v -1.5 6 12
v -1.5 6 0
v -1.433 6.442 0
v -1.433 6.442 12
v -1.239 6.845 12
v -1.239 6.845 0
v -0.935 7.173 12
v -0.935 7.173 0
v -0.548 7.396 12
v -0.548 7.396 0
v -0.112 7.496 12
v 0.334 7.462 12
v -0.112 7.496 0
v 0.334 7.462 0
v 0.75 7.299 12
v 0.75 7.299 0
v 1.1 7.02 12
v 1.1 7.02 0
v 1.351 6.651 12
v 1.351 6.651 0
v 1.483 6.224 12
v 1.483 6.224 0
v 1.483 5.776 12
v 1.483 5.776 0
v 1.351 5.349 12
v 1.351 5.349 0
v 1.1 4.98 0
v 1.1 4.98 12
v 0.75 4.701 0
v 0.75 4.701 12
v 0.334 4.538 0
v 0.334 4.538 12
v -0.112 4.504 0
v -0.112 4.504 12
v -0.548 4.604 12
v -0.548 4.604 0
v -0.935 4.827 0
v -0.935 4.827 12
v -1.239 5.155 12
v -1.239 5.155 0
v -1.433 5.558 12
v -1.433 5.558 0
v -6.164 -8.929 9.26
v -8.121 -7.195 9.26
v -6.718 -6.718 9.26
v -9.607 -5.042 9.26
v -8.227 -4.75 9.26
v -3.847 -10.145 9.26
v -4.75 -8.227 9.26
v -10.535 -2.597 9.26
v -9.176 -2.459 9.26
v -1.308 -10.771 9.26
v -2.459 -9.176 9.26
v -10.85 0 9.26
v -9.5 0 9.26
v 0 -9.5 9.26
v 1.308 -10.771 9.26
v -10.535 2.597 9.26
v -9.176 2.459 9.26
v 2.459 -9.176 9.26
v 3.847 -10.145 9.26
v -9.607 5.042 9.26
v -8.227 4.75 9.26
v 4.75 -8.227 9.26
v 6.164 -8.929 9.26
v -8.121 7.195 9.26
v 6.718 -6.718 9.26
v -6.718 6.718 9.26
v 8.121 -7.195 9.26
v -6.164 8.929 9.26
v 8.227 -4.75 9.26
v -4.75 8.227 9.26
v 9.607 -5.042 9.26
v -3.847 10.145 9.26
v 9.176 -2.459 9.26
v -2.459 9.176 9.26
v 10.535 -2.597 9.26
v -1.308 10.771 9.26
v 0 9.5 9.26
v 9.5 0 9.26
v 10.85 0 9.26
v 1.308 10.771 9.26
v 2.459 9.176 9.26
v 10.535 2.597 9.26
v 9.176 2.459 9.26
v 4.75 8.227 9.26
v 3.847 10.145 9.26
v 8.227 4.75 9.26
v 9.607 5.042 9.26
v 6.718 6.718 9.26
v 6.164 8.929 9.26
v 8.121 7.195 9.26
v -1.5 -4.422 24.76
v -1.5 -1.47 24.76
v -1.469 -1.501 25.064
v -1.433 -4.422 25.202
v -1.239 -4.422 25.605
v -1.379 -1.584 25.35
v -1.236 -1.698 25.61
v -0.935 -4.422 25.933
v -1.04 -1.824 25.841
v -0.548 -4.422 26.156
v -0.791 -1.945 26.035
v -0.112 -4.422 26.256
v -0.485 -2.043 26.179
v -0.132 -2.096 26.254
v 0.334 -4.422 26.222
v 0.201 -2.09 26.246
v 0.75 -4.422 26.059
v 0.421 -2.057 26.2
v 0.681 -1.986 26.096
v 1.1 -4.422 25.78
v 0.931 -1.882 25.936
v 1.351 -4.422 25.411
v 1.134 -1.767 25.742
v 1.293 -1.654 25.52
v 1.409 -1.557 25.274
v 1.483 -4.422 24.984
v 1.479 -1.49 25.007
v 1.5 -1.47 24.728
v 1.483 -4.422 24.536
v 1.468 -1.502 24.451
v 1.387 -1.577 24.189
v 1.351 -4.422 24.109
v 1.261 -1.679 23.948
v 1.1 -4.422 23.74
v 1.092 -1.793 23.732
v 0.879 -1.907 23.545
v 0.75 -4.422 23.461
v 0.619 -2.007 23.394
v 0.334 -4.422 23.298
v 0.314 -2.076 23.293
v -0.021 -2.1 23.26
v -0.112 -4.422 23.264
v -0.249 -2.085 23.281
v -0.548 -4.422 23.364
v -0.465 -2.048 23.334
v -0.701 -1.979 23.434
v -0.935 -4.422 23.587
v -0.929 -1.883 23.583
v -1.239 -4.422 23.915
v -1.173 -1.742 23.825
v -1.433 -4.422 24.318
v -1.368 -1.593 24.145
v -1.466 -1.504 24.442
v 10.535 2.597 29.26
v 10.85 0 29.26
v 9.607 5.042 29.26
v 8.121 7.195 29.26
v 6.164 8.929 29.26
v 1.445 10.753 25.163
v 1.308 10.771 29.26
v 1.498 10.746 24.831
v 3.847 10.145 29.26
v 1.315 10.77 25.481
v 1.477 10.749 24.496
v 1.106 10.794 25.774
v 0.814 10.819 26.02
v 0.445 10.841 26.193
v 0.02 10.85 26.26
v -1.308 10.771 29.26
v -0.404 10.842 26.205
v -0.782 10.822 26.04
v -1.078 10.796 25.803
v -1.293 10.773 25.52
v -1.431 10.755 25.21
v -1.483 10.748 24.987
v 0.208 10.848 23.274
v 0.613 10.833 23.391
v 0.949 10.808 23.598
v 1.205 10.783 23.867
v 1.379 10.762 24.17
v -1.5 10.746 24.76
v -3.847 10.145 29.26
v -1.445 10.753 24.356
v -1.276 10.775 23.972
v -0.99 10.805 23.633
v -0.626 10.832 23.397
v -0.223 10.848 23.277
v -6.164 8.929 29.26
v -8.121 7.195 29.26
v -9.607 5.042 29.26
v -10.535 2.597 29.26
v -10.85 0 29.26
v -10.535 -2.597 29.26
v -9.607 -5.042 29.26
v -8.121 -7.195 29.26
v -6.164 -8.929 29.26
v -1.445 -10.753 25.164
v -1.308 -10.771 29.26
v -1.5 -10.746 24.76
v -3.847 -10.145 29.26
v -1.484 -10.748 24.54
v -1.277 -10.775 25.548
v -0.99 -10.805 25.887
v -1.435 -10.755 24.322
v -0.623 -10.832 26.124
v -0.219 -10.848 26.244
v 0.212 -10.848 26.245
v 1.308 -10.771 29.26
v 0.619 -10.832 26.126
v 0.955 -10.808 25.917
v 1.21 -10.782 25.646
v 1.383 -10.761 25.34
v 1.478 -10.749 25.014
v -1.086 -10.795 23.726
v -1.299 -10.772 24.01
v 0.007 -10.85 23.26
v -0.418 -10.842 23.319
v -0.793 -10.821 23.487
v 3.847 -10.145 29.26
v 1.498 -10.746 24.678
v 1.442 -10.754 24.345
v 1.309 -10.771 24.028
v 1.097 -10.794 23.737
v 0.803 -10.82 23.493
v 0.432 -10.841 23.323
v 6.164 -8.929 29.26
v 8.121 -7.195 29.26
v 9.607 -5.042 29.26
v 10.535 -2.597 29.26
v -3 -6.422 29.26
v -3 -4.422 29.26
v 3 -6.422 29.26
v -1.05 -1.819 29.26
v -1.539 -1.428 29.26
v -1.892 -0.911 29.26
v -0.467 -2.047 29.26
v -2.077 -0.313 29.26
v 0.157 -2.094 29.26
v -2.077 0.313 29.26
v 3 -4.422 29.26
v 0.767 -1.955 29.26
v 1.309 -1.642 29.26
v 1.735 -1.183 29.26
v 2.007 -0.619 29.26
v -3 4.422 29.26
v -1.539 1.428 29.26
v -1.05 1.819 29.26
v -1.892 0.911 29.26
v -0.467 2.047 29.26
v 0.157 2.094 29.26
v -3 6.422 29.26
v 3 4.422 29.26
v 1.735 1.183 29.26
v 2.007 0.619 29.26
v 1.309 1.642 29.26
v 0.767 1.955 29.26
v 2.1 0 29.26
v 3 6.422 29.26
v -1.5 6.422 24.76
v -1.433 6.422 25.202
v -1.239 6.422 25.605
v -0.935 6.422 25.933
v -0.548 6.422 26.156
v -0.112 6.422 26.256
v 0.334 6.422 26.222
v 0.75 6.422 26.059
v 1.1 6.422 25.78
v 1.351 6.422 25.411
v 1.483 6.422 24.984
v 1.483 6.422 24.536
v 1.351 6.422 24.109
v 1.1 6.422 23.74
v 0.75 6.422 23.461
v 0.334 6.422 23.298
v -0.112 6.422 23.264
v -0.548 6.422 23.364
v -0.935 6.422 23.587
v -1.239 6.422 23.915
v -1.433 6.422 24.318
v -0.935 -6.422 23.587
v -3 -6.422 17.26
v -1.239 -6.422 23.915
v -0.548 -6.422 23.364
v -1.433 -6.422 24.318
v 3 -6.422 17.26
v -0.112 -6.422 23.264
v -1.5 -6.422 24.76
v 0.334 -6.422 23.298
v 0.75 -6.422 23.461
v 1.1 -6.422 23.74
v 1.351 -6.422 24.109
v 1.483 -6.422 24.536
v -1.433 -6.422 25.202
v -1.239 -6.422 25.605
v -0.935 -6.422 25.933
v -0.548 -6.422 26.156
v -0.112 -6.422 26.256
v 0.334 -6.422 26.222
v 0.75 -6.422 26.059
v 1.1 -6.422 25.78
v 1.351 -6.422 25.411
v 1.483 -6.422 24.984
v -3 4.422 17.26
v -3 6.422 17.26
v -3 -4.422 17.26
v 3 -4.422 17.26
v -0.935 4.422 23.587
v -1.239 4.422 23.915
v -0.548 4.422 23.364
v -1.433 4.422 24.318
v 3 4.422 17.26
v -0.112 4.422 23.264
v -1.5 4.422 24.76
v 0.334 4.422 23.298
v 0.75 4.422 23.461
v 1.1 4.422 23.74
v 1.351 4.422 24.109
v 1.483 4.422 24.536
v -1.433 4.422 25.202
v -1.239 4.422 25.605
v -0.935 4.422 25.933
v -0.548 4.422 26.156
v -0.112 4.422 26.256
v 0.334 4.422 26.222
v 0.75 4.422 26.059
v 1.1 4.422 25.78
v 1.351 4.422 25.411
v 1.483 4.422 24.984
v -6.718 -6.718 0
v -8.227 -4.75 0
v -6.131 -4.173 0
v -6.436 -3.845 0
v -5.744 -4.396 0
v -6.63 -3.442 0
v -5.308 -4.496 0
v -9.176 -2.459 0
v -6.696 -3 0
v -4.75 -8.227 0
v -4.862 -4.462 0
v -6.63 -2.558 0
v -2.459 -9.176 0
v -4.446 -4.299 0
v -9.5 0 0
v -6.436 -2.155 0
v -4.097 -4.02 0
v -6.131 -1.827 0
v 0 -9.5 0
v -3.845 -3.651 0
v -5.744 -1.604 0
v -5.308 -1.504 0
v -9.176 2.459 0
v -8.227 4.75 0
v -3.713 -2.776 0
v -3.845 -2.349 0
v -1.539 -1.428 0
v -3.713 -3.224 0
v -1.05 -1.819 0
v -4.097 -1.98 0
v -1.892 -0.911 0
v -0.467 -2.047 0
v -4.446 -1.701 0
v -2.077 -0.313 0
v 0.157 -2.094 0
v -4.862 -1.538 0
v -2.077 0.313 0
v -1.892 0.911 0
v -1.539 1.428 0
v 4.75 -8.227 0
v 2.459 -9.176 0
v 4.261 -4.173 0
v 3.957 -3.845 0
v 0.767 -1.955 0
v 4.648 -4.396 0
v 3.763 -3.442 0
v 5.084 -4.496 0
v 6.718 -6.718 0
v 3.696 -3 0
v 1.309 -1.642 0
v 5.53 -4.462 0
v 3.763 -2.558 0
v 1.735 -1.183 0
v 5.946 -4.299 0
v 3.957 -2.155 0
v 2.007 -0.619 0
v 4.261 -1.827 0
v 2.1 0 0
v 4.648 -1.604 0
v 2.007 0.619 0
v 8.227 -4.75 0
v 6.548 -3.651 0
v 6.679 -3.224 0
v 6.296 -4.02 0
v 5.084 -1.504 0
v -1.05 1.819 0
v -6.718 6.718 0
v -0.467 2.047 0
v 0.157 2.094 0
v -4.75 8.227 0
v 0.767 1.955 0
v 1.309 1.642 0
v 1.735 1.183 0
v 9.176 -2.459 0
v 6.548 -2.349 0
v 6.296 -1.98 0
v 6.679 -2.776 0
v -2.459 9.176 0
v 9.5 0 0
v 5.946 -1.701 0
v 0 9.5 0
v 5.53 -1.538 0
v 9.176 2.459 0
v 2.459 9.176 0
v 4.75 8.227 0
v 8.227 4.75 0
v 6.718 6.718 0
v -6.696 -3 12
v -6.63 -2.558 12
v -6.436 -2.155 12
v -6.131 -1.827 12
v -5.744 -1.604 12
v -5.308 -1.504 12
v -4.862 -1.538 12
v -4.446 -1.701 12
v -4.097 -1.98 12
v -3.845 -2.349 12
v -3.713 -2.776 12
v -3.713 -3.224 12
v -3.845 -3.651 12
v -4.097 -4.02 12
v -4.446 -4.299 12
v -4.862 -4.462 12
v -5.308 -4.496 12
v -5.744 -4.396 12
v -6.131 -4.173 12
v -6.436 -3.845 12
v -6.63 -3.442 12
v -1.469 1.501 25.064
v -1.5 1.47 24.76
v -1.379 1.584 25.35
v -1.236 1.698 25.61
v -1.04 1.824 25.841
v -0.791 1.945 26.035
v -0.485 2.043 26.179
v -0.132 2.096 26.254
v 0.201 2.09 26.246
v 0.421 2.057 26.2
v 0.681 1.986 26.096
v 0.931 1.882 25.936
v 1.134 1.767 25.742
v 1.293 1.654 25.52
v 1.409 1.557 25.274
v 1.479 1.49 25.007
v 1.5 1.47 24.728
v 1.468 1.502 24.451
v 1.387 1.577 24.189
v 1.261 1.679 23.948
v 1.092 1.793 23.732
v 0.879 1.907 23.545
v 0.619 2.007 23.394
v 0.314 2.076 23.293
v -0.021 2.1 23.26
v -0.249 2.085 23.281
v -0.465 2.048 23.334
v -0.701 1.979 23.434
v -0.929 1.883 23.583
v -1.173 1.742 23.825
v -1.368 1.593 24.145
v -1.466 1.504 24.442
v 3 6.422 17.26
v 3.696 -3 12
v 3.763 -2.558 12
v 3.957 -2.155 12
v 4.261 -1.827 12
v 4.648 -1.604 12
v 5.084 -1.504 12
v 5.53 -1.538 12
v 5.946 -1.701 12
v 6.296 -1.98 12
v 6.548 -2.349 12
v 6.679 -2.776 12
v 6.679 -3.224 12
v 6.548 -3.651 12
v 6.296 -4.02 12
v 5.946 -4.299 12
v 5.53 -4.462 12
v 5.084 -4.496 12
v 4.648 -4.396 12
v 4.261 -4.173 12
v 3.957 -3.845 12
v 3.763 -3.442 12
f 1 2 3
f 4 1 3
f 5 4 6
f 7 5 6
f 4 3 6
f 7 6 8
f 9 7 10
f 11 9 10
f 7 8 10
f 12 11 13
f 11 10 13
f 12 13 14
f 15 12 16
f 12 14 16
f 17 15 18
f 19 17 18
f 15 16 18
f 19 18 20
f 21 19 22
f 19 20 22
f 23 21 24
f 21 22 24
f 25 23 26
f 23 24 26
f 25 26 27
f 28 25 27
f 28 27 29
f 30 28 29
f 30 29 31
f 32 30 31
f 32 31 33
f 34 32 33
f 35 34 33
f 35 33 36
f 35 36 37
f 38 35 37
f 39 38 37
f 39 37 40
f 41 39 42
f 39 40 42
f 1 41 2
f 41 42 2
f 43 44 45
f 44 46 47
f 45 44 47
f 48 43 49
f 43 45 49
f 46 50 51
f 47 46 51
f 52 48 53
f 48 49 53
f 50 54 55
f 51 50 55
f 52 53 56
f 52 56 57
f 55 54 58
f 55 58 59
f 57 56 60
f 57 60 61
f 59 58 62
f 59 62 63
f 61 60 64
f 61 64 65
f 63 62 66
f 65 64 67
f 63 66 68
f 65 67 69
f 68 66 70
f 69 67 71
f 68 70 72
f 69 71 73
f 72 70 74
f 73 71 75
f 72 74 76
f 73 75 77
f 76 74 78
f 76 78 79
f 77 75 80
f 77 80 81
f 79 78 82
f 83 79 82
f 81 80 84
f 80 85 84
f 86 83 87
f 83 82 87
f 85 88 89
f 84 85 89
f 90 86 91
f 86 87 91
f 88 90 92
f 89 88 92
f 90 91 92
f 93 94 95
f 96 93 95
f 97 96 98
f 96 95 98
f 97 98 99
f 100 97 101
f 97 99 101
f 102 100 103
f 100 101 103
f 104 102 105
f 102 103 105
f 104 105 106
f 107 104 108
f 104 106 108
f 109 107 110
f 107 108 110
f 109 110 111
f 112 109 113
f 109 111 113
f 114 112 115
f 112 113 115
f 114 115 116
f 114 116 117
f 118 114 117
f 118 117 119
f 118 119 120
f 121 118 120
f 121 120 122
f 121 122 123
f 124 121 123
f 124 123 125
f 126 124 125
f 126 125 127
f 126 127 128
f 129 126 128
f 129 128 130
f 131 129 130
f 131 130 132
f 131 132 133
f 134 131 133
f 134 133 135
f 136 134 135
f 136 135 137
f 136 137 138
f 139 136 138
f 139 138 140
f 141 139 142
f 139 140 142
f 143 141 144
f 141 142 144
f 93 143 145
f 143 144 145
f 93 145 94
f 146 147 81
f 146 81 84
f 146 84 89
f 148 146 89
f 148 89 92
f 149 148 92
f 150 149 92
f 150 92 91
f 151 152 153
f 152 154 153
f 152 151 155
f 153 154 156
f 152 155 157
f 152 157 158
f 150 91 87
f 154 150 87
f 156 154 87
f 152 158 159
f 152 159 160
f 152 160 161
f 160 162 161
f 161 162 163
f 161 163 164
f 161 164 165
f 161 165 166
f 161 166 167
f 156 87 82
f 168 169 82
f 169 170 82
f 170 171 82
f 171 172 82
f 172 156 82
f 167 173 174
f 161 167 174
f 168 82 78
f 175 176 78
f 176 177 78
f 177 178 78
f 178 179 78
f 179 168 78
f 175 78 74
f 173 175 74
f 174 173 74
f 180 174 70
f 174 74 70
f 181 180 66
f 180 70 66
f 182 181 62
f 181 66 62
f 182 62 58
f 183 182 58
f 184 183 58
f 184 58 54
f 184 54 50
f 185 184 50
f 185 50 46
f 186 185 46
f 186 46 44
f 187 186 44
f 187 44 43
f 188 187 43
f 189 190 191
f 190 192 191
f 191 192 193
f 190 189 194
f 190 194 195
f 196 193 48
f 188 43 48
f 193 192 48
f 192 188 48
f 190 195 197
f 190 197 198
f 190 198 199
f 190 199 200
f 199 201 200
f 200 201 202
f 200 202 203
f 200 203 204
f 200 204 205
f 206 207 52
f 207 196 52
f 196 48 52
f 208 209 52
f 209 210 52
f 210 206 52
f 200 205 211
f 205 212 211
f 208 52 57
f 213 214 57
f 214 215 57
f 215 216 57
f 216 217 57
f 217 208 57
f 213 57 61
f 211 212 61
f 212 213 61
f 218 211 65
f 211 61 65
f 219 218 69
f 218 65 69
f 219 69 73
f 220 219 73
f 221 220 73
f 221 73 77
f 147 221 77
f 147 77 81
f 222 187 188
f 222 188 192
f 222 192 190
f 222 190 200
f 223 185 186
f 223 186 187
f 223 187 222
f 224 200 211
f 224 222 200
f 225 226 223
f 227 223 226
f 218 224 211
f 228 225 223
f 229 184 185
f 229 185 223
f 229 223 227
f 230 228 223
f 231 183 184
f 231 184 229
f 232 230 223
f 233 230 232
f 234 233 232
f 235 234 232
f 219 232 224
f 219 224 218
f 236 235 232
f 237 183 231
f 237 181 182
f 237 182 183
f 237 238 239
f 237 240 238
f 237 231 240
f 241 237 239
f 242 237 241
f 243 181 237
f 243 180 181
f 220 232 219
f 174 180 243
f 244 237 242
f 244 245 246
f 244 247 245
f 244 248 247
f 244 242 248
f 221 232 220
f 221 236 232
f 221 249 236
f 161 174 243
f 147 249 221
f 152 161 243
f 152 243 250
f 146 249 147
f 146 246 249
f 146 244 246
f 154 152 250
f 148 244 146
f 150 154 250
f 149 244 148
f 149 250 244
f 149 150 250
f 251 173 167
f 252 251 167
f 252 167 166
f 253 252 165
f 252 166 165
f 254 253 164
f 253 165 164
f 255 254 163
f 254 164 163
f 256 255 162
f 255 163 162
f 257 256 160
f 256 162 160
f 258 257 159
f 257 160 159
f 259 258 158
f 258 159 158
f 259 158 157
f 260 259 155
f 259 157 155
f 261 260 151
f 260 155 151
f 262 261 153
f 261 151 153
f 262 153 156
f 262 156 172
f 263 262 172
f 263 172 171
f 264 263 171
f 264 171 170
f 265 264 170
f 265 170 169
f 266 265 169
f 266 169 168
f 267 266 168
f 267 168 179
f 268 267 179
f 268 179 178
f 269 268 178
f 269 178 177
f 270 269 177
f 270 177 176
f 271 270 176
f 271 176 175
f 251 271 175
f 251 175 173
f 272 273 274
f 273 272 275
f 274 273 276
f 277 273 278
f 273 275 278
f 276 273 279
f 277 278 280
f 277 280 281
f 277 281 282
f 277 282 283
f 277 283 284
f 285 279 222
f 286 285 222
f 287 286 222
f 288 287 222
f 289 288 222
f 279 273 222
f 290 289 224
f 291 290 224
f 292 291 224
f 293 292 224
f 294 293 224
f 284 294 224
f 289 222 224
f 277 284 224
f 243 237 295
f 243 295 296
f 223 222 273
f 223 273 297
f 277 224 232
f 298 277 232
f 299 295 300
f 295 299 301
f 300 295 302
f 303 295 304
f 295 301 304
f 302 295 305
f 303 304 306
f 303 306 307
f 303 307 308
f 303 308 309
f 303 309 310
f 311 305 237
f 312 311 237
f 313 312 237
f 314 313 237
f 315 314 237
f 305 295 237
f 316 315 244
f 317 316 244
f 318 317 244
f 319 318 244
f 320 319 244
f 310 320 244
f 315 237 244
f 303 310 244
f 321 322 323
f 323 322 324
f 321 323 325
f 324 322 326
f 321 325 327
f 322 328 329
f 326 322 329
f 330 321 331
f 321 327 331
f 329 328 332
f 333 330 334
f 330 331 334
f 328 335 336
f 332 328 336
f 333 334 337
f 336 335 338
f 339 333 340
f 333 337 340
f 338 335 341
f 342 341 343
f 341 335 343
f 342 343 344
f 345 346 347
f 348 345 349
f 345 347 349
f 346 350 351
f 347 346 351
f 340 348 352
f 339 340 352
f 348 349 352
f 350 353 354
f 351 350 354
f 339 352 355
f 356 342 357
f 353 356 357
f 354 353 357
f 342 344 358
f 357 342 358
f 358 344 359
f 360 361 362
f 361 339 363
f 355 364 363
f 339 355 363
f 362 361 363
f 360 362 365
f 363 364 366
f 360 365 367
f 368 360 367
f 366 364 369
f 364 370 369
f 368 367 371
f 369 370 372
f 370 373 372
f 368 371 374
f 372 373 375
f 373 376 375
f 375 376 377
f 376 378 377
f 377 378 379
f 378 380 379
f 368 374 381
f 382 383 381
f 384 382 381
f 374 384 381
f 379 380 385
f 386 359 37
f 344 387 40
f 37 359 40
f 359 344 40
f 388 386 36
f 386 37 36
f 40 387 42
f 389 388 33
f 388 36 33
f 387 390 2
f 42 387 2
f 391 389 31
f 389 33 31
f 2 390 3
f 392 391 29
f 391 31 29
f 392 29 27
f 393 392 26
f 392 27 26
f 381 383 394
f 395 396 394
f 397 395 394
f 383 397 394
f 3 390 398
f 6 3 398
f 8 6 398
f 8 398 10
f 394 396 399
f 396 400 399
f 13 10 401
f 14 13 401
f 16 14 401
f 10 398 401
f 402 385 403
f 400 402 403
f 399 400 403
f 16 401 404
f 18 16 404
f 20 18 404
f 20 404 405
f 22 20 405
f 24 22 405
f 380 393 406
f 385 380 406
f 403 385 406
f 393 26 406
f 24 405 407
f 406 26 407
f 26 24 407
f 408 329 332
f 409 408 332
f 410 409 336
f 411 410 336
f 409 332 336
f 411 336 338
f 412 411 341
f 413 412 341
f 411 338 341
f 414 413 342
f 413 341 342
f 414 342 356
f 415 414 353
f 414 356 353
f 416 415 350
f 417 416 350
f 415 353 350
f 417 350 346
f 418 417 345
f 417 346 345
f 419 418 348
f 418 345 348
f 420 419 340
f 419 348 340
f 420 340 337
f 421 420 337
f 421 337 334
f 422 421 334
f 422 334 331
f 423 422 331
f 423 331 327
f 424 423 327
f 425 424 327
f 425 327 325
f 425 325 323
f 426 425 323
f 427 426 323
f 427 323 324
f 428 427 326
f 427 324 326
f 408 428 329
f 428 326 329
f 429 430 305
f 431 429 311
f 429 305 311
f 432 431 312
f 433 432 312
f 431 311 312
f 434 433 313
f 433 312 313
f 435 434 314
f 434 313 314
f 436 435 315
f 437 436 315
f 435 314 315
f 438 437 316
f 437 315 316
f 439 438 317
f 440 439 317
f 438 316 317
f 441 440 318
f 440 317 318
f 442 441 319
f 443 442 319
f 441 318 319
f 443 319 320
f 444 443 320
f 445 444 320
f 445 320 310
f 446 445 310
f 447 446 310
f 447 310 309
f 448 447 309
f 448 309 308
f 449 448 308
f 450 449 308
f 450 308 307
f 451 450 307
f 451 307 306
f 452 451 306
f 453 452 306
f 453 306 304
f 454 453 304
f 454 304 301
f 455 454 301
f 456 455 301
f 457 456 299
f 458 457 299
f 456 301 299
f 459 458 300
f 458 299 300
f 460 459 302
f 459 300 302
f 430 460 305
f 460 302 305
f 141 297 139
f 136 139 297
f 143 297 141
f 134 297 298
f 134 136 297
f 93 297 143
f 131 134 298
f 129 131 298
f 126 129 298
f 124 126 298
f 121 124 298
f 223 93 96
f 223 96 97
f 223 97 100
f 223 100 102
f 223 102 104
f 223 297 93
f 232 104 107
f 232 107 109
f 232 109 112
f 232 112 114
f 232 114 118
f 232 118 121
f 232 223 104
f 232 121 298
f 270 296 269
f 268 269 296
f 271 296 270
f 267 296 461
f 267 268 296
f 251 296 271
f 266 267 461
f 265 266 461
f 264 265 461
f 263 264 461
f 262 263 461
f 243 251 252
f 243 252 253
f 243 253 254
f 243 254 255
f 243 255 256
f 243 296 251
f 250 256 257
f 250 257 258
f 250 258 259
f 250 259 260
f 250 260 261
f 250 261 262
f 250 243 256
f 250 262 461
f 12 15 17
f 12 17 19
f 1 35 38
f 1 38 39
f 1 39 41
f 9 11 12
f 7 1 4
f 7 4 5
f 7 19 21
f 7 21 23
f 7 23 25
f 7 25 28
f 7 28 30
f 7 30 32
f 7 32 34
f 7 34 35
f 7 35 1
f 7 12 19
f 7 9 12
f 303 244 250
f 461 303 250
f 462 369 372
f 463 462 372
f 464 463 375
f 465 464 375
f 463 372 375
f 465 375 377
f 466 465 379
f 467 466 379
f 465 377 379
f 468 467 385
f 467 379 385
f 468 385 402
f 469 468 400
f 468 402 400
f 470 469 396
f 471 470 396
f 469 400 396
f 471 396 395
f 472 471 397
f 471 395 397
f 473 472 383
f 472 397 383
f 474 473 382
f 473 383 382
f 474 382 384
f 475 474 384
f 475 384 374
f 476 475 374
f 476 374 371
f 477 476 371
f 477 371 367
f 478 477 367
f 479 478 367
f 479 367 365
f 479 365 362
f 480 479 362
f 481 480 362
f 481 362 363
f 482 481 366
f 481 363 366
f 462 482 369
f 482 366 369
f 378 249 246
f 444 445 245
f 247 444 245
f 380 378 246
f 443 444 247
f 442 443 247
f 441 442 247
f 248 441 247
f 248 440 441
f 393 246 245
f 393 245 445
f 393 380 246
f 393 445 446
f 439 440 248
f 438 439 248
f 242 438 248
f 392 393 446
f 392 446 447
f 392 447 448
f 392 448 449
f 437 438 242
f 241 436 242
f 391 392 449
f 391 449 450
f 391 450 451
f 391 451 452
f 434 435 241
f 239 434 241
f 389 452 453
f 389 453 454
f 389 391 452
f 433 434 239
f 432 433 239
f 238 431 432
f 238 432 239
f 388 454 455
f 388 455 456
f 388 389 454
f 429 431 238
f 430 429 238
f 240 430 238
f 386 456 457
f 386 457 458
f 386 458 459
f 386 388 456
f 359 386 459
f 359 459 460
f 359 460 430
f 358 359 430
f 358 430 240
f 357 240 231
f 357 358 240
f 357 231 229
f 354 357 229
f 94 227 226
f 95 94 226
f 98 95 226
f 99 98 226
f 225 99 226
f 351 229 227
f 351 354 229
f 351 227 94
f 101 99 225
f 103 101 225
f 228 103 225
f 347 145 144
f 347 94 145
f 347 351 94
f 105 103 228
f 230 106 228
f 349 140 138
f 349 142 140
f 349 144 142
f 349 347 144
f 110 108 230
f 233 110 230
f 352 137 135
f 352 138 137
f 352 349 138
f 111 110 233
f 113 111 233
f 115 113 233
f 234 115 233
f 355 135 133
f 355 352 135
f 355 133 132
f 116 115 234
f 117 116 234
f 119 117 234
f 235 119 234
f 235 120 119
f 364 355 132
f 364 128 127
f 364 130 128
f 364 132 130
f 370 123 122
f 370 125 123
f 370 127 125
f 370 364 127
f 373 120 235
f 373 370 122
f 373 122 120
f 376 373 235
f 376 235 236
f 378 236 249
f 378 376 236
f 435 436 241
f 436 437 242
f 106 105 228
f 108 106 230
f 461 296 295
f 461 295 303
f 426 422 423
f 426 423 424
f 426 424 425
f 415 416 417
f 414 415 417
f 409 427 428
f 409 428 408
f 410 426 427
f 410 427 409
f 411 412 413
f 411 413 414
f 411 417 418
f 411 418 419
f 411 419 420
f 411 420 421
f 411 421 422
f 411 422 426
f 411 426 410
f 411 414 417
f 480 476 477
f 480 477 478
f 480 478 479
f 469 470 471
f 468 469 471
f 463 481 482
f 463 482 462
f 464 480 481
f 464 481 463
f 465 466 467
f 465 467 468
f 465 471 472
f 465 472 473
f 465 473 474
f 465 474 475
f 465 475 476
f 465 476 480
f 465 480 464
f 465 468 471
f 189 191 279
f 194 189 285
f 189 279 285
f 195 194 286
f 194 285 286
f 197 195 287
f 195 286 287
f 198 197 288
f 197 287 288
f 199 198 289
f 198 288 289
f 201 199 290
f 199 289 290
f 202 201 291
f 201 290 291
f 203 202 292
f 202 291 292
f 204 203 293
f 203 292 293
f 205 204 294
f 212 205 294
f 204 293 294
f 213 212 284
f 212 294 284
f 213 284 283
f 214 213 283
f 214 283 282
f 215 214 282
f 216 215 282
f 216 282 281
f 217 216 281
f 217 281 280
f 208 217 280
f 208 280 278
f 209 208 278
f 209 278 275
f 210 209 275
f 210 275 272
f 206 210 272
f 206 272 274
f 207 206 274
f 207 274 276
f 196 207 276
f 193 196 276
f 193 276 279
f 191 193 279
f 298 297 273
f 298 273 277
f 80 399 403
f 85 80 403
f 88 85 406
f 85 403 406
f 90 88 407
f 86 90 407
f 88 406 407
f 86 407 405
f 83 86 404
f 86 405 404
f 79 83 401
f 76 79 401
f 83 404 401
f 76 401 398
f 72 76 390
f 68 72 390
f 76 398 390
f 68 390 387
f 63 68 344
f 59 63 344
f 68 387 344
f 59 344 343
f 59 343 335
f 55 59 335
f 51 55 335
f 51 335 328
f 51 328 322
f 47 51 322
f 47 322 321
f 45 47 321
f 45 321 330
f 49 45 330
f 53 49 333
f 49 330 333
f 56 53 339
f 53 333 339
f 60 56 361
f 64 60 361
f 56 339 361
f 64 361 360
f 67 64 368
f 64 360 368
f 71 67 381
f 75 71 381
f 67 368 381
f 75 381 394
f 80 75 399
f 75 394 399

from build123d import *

# Parameters (mm, degrees)
SKETCH1_R           = 9.5
SKETCH1_R_2         = 2.1
BOSS_EXTRUDE1_DEPTH = 9.26
SKETCH2_R           = 10.85
SKETCH2_R_2         = 2.1
BOSS_EXTRUDE2_DEPTH = 20
SKETCH3_W           = 6
SKETCH3_H           = 2
CUT_EXTRUDE1_DEPTH  = 12
SKETCH4_R           = 1.5
CUT_EXTRUDE2_DEPTH  = 39.01
SKETCH5_R           = 1.5
CUT_EXTRUDE3_DEPTH  = 12


with BuildPart() as part:
    # Sketch1 → Boss-Extrude1 (new body)
    with BuildSketch(Plane.XY):
        Circle(SKETCH1_R)
        Circle(SKETCH1_R_2, mode=Mode.SUBTRACT)
    extrude(amount=BOSS_EXTRUDE1_DEPTH)

    # Sketch2 → Boss-Extrude2 (add)
    with BuildSketch(Plane.XY.offset(9.26)):
        Circle(SKETCH2_R)
        Circle(SKETCH2_R_2, mode=Mode.SUBTRACT)
    extrude(amount=BOSS_EXTRUDE2_DEPTH)

    # Sketch3 → Cut-Extrude1 (cut)
    with BuildSketch(Plane.XY.offset(29.26)):
        with Locations((0, 5.422033923)):
            Rectangle(SKETCH3_W, SKETCH3_H)
        with Locations((0, -5.422033923)):
            Rectangle(SKETCH3_W, SKETCH3_H)
    extrude(amount=-CUT_EXTRUDE1_DEPTH, mode=Mode.SUBTRACT)

    # Sketch4 → Cut-Extrude2 (cut, through all)
    with BuildSketch(Plane(origin=(0, 10.85, 0), x_dir=(1, 0, 0), z_dir=(0, 1, 0))):
        with Locations(Location((0, -24.76, 0), (0, 0, 180))):
            Circle(SKETCH4_R)
    extrude(amount=-CUT_EXTRUDE2_DEPTH, mode=Mode.SUBTRACT)

    # Sketch5 → Cut-Extrude3 (cut)
    with BuildSketch(Plane(origin=(0, 0, 0), x_dir=(-1, 0, 0), z_dir=(0, 0, -1))):
        with Locations((0, 6)):
            Circle(SKETCH5_R)
        with Locations((5.196152423, -3)):
            Circle(SKETCH5_R)
        with Locations((-5.196152423, -3)):
            Circle(SKETCH5_R)
    extrude(amount=-CUT_EXTRUDE3_DEPTH, mode=Mode.SUBTRACT)


solid = part.part
